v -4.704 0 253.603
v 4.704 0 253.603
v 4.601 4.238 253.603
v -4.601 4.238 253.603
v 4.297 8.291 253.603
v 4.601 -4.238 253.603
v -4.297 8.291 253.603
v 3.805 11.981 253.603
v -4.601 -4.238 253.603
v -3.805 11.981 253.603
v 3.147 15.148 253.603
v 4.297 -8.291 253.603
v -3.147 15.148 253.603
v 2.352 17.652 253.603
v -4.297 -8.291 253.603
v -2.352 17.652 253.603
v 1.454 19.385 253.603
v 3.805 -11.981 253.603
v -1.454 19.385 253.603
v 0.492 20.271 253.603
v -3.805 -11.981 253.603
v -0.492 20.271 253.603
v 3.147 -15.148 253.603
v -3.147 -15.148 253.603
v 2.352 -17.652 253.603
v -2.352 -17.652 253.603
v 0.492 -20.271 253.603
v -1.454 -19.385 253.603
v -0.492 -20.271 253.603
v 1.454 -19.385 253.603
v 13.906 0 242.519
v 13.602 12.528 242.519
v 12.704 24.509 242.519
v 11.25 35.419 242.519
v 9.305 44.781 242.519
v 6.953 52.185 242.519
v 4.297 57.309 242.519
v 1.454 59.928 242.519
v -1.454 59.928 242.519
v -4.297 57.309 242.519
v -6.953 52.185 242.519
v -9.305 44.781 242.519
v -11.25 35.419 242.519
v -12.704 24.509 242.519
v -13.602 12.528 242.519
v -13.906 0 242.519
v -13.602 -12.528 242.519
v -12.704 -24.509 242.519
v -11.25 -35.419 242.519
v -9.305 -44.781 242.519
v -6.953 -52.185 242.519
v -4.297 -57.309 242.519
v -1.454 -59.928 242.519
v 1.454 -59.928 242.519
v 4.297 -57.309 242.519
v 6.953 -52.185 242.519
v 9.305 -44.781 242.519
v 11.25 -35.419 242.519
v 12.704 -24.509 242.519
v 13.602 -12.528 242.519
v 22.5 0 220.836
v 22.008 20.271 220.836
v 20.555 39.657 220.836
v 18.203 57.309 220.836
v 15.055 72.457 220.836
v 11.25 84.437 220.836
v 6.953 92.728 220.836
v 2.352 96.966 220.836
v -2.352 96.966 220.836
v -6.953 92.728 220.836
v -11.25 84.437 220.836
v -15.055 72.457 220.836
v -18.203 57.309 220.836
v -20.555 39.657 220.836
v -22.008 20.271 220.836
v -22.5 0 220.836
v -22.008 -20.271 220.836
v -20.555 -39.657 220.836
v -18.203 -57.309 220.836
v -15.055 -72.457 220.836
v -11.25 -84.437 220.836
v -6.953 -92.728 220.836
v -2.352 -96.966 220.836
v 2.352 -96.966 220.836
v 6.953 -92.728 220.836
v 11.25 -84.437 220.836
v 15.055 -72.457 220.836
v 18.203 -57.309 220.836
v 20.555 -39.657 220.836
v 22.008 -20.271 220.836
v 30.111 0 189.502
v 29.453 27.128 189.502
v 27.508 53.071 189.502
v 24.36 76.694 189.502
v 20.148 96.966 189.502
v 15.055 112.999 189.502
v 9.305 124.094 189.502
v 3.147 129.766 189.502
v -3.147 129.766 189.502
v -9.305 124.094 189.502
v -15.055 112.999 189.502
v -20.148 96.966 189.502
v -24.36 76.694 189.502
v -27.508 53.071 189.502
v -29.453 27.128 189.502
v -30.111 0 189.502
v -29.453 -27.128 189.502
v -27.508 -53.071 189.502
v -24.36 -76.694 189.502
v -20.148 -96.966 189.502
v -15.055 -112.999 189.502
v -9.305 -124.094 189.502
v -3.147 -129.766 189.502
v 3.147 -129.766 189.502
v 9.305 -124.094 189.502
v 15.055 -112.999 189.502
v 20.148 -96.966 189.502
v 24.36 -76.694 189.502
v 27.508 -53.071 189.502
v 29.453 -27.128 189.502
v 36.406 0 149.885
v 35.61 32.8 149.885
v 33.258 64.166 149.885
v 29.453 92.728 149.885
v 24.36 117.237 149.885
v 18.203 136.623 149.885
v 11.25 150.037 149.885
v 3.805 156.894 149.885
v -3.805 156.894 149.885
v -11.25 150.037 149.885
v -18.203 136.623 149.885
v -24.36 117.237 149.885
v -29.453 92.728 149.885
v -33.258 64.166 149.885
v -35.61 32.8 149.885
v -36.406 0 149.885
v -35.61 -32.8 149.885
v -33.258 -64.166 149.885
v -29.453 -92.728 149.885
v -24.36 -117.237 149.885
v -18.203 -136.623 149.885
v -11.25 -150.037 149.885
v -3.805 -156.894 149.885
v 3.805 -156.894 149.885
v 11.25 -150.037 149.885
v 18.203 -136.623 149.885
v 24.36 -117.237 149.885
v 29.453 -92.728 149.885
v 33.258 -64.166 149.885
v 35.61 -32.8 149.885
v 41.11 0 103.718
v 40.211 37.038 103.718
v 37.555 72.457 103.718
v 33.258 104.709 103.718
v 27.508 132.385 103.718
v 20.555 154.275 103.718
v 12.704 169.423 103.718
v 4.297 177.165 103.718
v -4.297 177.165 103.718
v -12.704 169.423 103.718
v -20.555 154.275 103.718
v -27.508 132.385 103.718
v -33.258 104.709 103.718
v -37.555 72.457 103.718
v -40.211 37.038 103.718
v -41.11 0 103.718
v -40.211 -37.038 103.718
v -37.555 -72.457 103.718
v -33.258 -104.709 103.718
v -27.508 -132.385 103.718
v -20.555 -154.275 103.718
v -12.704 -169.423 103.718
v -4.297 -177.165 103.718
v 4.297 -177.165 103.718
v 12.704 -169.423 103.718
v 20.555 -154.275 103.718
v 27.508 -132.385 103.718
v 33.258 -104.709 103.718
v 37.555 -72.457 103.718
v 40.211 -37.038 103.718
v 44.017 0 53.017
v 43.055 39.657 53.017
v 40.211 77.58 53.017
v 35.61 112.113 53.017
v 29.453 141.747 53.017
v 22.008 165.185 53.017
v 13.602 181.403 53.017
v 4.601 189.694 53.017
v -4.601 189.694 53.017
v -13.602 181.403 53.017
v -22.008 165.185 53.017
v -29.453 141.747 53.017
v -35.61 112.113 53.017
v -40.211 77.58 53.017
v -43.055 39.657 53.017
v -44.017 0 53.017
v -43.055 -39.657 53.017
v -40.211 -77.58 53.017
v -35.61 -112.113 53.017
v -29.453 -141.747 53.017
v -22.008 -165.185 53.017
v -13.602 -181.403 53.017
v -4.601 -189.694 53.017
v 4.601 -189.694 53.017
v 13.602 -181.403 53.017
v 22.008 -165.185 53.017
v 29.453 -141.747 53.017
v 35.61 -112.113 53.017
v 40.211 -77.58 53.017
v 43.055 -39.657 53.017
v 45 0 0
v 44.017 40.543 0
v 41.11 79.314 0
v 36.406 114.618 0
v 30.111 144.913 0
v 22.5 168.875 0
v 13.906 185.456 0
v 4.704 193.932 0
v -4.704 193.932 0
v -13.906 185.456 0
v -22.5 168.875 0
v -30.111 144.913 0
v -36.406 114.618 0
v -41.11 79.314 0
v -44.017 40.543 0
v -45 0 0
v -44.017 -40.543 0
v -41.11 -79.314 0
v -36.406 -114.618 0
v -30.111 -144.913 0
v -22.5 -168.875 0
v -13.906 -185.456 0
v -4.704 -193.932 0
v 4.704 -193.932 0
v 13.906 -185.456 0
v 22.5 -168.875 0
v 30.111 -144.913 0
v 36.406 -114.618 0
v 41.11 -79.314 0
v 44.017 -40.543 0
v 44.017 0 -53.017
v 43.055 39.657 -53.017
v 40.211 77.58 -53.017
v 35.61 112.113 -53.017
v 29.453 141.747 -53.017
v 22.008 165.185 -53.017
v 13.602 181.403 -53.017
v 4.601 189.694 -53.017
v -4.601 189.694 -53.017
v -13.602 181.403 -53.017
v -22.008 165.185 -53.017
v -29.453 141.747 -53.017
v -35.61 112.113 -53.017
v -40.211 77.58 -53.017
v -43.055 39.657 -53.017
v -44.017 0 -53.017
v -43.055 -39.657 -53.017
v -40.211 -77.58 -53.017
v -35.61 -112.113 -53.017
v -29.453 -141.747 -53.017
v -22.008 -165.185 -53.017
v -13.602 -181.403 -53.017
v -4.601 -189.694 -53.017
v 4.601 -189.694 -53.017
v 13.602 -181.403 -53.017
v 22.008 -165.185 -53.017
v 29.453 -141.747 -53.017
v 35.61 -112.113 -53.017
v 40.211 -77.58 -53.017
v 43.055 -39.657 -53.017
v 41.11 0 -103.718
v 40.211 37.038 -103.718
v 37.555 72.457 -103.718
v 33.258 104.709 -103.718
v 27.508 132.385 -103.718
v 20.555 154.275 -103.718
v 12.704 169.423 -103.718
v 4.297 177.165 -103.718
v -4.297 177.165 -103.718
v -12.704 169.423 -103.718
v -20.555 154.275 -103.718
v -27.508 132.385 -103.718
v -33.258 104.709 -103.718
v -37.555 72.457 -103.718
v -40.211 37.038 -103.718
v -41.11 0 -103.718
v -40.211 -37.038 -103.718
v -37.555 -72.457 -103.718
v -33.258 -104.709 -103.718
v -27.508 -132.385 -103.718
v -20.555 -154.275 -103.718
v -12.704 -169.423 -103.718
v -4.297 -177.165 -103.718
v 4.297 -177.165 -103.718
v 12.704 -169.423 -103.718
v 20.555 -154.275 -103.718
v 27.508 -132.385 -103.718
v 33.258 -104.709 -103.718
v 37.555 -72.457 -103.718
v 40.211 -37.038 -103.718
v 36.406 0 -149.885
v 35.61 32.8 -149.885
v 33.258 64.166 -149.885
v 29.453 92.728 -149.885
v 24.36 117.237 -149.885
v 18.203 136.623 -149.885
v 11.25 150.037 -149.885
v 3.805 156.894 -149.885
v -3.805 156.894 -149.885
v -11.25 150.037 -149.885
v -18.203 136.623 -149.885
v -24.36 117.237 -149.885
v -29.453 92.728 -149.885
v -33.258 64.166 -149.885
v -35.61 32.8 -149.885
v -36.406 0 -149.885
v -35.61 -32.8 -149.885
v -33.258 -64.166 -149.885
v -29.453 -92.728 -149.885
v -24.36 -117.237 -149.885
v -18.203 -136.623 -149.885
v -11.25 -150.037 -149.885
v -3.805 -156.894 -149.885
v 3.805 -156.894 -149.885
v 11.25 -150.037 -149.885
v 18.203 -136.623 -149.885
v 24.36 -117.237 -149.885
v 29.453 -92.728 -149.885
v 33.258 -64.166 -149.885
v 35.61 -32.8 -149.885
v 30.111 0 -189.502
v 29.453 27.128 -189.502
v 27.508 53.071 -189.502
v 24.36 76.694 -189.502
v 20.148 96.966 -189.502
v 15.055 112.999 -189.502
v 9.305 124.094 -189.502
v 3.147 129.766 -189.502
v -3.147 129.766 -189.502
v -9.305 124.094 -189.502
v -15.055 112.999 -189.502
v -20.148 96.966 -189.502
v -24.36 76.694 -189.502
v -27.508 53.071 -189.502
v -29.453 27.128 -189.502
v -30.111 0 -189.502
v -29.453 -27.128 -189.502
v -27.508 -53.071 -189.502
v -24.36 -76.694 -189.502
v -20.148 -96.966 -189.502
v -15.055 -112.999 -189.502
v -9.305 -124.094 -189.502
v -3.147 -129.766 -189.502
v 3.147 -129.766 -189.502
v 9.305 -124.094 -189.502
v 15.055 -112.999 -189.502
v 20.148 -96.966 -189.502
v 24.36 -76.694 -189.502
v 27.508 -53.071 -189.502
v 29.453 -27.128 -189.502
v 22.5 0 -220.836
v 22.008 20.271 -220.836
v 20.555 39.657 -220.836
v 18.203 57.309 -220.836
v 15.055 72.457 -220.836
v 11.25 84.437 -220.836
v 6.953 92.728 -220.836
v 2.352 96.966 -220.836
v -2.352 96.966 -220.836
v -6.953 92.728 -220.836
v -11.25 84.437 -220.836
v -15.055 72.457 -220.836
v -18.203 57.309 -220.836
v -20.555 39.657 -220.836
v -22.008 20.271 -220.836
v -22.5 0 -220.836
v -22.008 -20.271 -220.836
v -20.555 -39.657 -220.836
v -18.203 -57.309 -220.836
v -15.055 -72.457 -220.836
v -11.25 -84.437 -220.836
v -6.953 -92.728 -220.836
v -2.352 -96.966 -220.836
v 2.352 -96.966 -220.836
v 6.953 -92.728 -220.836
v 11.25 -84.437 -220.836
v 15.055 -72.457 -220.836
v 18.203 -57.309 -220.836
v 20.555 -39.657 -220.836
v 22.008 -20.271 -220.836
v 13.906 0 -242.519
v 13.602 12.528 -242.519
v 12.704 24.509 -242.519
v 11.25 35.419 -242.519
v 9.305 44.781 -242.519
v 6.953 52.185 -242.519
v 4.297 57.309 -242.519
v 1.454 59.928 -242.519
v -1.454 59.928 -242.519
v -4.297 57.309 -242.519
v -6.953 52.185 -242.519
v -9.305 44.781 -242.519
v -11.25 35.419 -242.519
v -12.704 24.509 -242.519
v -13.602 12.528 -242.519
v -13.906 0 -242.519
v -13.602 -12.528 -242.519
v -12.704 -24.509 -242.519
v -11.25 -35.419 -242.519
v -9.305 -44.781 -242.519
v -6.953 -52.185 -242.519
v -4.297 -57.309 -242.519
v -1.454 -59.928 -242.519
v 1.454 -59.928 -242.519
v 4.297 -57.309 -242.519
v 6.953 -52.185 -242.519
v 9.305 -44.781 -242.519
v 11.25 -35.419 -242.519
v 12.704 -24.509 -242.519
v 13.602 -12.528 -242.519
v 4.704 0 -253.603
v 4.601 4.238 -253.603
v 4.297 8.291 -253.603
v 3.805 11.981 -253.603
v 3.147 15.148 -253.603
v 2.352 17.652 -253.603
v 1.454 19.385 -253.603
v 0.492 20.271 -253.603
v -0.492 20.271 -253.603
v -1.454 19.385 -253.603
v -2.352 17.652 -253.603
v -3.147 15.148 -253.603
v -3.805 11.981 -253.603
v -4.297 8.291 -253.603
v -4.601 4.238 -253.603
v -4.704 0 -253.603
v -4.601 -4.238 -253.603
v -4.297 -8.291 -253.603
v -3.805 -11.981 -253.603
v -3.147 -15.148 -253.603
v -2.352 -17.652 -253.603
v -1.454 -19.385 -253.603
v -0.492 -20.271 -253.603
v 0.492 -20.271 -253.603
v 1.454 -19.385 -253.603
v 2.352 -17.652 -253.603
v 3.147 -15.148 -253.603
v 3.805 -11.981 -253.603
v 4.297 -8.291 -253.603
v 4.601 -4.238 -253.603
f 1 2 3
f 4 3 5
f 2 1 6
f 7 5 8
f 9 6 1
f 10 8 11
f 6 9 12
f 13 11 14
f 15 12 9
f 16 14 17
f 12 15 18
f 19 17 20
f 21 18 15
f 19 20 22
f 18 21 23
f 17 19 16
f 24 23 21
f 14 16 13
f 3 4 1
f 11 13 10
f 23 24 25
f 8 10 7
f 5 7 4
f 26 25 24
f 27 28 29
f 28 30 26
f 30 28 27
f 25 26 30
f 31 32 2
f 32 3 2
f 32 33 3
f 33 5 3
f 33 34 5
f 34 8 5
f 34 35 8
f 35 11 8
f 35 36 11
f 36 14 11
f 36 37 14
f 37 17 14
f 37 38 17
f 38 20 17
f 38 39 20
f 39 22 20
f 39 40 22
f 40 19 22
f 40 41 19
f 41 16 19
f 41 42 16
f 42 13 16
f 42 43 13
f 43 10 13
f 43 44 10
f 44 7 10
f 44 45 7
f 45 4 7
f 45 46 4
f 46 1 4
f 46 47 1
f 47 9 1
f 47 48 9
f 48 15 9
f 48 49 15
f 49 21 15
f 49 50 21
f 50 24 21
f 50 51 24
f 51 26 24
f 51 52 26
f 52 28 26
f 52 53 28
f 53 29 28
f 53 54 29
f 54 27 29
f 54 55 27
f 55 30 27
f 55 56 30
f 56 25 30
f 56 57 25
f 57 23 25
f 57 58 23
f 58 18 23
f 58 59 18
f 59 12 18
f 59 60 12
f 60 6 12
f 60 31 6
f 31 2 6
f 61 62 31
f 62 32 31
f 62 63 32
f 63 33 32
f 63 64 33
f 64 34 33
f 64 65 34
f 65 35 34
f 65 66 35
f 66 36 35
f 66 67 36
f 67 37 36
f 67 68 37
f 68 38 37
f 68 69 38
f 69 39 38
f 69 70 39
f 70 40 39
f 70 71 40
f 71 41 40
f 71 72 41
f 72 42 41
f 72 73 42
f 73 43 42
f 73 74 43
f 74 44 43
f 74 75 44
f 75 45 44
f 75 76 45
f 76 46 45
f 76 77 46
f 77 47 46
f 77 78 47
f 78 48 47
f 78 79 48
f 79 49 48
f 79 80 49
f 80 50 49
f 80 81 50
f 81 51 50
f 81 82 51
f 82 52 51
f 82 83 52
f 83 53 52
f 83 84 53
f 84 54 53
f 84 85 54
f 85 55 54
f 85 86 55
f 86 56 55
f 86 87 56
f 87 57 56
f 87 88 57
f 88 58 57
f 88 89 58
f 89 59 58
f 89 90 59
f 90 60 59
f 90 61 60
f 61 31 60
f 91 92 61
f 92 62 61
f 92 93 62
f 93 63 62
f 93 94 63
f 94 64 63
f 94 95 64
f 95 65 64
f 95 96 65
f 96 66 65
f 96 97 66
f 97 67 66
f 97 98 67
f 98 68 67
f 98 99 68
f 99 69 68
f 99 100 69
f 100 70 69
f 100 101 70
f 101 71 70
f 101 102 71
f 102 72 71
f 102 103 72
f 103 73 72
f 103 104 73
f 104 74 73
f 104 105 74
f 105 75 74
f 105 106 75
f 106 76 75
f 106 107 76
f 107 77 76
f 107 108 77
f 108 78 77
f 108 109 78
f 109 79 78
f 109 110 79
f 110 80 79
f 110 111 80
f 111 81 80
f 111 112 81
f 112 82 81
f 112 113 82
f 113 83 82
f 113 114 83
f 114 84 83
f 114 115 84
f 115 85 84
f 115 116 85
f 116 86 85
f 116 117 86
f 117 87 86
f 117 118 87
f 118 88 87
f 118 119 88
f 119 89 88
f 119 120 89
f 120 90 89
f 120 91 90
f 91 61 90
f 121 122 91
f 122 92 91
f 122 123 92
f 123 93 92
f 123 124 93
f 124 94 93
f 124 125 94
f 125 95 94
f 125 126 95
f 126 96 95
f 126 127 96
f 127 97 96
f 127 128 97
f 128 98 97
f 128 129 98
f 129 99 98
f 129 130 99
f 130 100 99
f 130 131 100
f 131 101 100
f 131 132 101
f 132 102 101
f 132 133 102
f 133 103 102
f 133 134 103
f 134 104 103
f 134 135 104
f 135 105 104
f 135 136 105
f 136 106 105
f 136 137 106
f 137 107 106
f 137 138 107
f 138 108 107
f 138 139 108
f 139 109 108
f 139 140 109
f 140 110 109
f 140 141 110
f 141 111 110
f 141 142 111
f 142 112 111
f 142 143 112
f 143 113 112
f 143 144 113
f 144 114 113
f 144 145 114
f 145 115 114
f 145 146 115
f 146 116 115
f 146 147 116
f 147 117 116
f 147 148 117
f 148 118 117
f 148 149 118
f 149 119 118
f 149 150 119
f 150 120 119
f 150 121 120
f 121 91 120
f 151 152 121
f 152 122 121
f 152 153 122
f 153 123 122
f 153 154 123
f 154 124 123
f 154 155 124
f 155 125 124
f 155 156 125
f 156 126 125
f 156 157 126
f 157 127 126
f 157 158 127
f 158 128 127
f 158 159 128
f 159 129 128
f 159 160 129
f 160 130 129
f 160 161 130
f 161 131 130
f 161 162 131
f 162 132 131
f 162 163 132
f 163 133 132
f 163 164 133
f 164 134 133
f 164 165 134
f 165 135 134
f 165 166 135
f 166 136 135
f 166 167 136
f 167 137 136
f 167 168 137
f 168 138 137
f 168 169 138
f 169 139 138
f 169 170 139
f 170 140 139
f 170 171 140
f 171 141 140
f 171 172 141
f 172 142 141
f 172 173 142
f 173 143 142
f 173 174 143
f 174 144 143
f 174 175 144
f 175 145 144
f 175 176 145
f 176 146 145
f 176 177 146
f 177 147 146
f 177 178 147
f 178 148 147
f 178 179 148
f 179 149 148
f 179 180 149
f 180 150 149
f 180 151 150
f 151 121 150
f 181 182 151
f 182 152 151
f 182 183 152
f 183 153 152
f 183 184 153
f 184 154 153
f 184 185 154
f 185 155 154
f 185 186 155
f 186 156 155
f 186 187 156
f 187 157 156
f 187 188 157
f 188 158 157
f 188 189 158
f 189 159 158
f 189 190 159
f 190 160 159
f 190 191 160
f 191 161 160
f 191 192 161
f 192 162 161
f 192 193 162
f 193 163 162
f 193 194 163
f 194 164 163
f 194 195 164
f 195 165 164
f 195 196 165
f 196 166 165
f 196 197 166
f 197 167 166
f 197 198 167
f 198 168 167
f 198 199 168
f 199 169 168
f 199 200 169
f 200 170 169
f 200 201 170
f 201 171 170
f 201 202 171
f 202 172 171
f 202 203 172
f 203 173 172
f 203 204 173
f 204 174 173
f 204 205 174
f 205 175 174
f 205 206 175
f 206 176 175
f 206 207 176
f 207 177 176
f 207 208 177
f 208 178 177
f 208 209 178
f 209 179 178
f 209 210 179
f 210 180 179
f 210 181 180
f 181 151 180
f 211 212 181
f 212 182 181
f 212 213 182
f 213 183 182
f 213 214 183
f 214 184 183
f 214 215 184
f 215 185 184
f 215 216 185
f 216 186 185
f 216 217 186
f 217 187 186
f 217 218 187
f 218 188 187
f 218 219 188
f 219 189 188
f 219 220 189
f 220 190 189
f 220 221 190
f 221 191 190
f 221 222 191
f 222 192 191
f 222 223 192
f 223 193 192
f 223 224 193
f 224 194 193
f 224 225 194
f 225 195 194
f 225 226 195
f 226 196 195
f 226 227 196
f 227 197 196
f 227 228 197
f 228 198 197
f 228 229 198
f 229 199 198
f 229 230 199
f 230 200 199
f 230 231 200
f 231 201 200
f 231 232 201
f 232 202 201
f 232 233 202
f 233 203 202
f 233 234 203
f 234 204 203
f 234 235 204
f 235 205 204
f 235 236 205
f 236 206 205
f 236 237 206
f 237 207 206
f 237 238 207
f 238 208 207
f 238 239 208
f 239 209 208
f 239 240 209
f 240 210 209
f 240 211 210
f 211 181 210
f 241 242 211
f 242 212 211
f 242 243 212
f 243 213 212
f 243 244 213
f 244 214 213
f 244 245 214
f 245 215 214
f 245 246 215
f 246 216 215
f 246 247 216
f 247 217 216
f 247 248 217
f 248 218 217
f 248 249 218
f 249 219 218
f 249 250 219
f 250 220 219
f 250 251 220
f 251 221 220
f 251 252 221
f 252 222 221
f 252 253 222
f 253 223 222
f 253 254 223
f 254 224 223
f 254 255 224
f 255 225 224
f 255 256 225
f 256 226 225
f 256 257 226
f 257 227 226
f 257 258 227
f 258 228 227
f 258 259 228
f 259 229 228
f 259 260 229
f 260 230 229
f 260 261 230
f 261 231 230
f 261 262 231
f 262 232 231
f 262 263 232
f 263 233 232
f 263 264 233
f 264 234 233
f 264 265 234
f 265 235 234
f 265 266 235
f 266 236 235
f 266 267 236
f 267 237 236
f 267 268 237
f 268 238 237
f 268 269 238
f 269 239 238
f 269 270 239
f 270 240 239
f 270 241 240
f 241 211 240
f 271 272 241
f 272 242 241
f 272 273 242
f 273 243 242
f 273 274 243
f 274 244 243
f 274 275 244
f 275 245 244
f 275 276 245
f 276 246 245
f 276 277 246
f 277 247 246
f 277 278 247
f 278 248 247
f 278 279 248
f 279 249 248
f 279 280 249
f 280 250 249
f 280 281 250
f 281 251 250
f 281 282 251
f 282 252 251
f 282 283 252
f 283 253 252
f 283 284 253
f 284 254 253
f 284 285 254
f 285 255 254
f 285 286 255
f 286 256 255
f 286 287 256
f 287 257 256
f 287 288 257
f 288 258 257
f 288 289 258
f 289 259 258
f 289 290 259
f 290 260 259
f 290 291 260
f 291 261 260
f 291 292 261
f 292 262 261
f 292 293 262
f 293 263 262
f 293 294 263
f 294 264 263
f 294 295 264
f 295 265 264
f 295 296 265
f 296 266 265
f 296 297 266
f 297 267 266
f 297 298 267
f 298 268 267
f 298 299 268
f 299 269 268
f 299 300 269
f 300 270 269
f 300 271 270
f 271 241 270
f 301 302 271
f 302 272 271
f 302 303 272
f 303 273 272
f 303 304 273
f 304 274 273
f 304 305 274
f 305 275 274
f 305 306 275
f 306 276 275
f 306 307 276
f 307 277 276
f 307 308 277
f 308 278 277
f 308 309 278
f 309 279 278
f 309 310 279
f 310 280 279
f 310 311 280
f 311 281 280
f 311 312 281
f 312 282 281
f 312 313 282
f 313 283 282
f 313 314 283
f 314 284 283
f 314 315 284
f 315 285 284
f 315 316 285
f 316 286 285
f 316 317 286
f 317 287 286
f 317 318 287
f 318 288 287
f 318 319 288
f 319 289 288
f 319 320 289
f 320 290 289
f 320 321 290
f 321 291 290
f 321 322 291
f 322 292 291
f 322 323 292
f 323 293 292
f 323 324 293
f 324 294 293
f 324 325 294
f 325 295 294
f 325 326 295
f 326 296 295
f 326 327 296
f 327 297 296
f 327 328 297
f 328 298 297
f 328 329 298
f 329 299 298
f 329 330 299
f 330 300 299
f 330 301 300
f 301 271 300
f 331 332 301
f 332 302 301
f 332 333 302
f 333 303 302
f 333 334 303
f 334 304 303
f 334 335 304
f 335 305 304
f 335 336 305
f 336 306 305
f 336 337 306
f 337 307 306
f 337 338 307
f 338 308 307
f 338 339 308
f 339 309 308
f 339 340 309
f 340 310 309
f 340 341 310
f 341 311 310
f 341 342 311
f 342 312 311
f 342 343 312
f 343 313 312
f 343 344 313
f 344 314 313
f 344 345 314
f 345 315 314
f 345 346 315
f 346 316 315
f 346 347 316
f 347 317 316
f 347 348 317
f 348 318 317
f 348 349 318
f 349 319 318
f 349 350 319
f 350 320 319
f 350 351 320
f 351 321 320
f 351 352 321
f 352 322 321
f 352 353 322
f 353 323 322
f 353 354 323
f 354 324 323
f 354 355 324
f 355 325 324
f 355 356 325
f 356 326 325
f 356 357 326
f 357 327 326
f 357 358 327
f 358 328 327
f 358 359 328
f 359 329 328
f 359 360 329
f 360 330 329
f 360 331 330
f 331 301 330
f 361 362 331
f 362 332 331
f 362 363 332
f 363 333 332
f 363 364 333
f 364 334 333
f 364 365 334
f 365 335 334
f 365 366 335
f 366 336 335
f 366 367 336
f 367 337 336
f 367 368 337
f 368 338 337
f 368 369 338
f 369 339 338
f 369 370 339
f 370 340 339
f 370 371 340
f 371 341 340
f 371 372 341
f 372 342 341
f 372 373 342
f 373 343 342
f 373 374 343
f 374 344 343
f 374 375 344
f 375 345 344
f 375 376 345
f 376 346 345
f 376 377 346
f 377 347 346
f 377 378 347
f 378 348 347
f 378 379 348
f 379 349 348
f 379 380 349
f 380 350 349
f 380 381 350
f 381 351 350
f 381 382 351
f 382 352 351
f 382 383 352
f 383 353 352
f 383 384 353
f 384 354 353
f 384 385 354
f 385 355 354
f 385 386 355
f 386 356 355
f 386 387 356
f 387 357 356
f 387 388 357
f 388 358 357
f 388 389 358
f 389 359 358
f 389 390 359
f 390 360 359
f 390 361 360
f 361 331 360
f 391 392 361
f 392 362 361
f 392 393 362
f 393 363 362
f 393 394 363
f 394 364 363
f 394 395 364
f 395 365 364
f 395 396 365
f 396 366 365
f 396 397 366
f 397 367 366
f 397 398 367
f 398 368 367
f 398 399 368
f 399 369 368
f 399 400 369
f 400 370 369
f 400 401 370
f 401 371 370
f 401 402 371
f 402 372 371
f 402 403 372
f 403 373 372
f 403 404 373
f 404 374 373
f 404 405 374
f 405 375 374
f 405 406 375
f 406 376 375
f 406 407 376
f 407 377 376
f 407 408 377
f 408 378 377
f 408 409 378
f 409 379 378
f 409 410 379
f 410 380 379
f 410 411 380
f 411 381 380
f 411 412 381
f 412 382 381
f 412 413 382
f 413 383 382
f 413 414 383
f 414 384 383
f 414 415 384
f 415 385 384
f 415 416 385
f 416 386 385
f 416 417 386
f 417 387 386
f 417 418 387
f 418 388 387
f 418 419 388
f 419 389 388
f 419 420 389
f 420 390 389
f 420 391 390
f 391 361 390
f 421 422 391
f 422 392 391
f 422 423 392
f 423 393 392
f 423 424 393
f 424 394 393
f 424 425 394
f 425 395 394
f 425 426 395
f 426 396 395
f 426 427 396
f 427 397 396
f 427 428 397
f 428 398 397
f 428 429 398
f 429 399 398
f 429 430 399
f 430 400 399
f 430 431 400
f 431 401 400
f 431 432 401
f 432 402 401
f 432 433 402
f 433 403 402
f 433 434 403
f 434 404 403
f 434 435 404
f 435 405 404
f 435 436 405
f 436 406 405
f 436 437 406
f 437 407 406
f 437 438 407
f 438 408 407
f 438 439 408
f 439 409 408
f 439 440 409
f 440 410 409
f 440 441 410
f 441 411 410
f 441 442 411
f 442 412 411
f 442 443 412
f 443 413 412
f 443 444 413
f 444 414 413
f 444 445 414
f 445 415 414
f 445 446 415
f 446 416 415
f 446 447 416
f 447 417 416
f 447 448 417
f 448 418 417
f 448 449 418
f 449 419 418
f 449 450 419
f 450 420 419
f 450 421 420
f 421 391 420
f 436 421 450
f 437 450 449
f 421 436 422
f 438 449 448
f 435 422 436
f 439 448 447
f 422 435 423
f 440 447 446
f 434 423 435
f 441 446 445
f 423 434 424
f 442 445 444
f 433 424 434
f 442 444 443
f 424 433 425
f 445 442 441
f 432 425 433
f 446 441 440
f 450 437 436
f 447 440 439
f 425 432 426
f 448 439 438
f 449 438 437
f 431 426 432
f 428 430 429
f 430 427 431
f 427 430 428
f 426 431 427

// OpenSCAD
// Generated by SolidPython 1.0.1 on 2020-07-29 00:46:45


scale(v = [3, 13, 17]) {
	sphere(r = 15);
}
/***********************************************
*********      SolidPython code:      **********
************************************************
 
# import packages: SolidPython
from solid import *
from solid.utils import *
from itertools import chain, combinations, permutations


class Resize:

    def __init__(self, scad_file):
        self.scad_file = scad_file
        #self.scad_file = import_scad(scad_file)
        # cone/cylinder param:
        self.r1 = 0
        self.r2 = 0
        self.h = 0
        # rectangular prism param:
        self.w = 0
        self.l = 0
        # ellipse param:
        self.r = 0

    # import OpenScad code (file name corresponds to shape)


    # classify shape + parameters
    def assign(self, param1, param2, param3):
        if self.scad_file == 'cone.scad':
            self.r1 = param1
            self.r2 = param2
            self.h = param3
        elif self.scad_file == 'cylinder.scad':
            self.r1 = param1
            self.r2 = param2
            self.h = param3
        elif self.scad_file == 'rectangularPrism.scad':
            self.h = param1
            self.l = param2
            self.w = param3
        else:
            self.r = param1
            self.h = param2

    # resize parameters
    def iterate(self):
        x = range(3, 20, 2)
        i = 1
        if self.scad_file == 'cone.scad':
            tempList = list(permutations(x, 2))
            for temp in tempList:
                param1 = temp[0]
                param2 = temp[1]
                filepath = 'produced_scad_files/' + 'cone' + str(param1) + '_' + str(param2) + '_' + '.scad'
                scad_render_to_file(cylinder(h=param1, r1=param2, r2=0), filepath)

        elif self.scad_file == 'cylinder.scad':
            tempList = list(permutations(x, 3))
            for temp in tempList:
                param1 = temp[0]
                param2 = temp[1]
                filepath = 'produced_scad_files/' + 'cylinder' + str(param1) + '_' + str(param2) + '_' + '.scad'
                scad_render_to_file(cylinder(h=param1, r1=param2, r2=param2), filepath)

        elif self.scad_file == 'rectangularPrism.scad':
            tempList = list(permutations(x, 3))
            for temp in tempList:
                param1 = temp[0]
                param2 = temp[1]
                param3 = temp[2]
                filepath = 'produced_scad_files/' + 'rectangularPrism' + str(param1) + '_' + str(param2) + '_' + str(
                    param3) + '.scad'
                scad_render_to_file(cube(size=(param1, param2, param3)), filepath)

        elif self.scad_file == 'ellipse.scad':
            tempList = list(permutations(x, 4))
            for temp in tempList:
                param1 = temp[0]
                param2 = temp[1]
                param3 = temp[2]
                param4 = temp[3]
                filepath = 'produced_scad_files/' + 'ellipse' + str(param1) + '_' + str(param2) + '_' + str(param3) + '_' + str(param4) + '.scad'
                scad_render_to_file(scale([param1, param2, param3])(sphere(r=param4)), filepath)

    def render_to_scadfile(self):
        scad_render_to_file(scad, 'example.scad') 
 
************************************************/
